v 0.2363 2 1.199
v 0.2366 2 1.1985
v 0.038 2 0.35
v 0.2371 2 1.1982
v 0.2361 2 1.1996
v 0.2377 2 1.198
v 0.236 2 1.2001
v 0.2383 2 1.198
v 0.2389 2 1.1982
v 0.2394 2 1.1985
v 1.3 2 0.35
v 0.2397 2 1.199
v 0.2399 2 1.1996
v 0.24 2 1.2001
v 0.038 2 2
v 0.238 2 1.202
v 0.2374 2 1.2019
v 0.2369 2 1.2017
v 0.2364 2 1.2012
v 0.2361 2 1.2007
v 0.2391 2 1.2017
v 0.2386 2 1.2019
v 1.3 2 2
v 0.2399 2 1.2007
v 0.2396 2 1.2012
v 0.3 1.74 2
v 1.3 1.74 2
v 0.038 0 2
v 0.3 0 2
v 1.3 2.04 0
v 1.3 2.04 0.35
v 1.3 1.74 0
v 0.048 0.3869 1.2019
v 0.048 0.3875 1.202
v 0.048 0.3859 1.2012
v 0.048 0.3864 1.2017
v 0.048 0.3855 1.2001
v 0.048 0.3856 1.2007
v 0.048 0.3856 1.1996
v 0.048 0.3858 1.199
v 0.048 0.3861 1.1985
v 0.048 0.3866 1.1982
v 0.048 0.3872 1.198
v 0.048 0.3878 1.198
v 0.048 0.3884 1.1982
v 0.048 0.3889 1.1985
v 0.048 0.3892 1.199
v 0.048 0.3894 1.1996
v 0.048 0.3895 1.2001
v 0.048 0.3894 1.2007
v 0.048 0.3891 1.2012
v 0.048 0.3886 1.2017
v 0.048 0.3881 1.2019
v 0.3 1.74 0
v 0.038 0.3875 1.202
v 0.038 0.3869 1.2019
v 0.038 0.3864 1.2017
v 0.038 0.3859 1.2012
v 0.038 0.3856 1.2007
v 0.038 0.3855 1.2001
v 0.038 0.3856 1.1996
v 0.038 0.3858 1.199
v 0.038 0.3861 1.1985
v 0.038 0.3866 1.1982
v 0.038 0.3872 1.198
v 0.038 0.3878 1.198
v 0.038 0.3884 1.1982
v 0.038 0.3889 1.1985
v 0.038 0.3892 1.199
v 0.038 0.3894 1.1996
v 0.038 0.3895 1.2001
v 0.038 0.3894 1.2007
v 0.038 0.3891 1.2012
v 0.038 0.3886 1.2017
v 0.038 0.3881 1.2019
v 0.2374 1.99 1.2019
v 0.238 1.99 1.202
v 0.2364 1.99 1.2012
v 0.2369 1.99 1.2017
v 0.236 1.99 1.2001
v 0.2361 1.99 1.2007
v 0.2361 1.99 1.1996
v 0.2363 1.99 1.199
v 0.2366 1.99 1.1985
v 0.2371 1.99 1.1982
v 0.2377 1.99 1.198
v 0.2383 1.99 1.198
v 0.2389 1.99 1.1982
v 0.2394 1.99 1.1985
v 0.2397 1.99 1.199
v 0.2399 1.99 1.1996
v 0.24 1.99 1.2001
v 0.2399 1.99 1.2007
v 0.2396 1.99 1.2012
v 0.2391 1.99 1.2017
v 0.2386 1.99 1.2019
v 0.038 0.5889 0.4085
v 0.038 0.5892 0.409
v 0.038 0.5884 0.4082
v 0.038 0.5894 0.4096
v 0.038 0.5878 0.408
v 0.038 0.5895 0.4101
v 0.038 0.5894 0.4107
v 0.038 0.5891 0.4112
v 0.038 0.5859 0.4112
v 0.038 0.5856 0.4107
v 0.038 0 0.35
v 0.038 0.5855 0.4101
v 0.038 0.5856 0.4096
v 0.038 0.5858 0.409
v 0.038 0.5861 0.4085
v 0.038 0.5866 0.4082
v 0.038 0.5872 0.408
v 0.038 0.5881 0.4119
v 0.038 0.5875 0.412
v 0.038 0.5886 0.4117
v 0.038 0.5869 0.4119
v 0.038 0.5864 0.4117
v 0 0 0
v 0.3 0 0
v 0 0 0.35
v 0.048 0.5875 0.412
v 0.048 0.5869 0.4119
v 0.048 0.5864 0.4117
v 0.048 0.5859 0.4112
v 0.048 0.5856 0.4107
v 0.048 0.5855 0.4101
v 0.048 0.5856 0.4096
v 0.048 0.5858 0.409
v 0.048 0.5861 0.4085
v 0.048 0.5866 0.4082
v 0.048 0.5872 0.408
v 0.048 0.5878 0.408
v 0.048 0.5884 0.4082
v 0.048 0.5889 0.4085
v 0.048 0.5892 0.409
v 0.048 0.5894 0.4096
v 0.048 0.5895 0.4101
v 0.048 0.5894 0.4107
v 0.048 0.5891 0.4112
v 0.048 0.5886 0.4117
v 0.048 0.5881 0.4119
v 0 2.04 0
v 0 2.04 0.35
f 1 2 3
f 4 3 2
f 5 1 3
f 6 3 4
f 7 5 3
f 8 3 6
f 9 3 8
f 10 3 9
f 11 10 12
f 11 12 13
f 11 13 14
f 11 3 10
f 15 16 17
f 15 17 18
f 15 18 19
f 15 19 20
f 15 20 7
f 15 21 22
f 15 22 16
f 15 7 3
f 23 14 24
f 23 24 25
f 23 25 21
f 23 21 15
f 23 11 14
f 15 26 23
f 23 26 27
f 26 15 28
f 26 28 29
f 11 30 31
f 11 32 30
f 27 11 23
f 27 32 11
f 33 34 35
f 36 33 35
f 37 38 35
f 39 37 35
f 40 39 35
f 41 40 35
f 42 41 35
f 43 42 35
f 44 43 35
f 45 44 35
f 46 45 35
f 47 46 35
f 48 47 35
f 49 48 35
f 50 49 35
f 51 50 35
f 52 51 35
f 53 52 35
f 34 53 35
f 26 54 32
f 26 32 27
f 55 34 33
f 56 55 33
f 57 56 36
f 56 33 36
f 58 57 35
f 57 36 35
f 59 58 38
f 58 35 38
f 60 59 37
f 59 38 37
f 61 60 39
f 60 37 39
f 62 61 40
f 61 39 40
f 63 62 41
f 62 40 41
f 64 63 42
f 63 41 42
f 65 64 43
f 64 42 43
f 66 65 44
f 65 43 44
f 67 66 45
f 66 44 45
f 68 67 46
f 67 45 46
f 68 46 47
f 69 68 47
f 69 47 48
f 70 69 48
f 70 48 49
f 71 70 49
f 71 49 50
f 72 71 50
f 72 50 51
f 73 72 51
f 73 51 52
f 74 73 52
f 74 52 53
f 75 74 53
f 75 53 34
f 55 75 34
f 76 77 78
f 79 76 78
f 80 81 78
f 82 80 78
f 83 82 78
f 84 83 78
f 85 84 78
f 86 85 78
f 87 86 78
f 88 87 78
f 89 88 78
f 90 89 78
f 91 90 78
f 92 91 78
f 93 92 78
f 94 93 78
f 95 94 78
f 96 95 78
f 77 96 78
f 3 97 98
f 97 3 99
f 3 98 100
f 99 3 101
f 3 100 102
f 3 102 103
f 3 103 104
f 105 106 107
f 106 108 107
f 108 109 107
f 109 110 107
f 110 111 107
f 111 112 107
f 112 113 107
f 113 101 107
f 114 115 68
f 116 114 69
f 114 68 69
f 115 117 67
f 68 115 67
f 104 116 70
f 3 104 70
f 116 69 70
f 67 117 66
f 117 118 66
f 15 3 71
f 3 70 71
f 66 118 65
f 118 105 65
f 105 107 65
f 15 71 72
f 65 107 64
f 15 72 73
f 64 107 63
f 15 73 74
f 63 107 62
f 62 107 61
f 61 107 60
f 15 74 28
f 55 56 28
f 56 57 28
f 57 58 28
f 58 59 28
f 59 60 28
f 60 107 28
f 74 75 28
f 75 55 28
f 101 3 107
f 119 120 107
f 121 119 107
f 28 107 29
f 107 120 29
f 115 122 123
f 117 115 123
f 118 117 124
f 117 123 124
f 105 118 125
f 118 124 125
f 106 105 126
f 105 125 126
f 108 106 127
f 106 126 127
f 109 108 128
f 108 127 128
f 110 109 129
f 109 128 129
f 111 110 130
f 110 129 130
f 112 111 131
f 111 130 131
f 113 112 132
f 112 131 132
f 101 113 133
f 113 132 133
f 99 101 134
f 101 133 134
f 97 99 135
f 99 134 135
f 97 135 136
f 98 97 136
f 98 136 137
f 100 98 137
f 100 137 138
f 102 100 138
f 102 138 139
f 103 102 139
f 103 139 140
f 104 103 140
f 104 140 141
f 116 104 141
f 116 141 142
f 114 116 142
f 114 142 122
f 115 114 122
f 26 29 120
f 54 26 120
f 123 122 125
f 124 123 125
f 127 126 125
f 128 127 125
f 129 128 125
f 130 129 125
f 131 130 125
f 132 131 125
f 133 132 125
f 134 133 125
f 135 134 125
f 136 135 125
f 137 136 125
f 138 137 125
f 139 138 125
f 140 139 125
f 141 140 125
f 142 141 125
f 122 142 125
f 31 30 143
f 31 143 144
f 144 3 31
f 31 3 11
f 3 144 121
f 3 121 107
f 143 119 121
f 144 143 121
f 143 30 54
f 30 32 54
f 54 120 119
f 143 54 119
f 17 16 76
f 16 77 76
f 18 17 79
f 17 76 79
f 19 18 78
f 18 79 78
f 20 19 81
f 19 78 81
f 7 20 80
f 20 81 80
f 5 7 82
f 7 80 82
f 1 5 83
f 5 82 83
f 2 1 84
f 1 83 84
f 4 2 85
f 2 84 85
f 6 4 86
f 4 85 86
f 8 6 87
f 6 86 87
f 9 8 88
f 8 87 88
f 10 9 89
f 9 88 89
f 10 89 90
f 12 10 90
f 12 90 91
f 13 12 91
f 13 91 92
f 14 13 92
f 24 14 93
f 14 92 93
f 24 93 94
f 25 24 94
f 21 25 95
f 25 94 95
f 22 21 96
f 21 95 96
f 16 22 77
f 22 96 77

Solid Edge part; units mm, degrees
sketch "Sketch1" plane through (0, 0, 0) normal (0, -1, 0) x (1, 0, 0)
  line L0 (0, 0) -> (0, 0.35)
  line L1 (0, 0.35) -> (0.038, 0.35)
  line L2 (0.038, 0.35) -> (0.038, 2)
  line L3 (0.038, 2) -> (0.3, 2)
  line L4 (0.3, 2) -> (0.3, 0)
  line L5 (0.3, 0) -> (0, 0)
  dimension "D1" = 0.35
  dimension "D2" = 0.038
  dimension "D3" = 0.3
  dimension "D4" = 2
extrude "Protrusion1" add sketch "Sketch1" against normal blind 2
hole "Bohrung_1" at (0.038, 0.5875, 0.41) direction (1, 0, 0) diameter 0.004 depth 0.01
hole "Hole1" at (0.038, 0.3875, 1.2) direction (1, 0, 0) diameter 0.004 depth 0.01
hole "Bohrung_3" at (0.238, 2, 1.2) direction (0, -1, 0) diameter 0.004 depth 0.01
sketch "Sketch2" plane through (0.15, 2, 1) normal (0, 1, 0) x (0, 0, 1)
  line L0 (-1, 0.15) -> (-1, -0.15)
  line L1 (-1, -0.15) -> (-0.65, -0.15)
  line L2 (-0.65, -0.15) -> (-0.65, 0.15)
  line L3 (-0.65, 0.15) -> (-1, 0.15)
extrude "Ausprägung_2" add sketch "Sketch2" along normal blind 0.04
sketch "Sketch3" plane through (0.3, 1.02, 1) normal (1, 0, 0) x (0, 1, 0)
  line L0 (1.02, -1) -> (1.02, -0.65)
  line L1 (1.02, -0.65) -> (0.98, -0.65)
  line L2 (0.98, -0.65) -> (0.98, 1)
  line L3 (0.98, 1) -> (0.72, 1)
  line L4 (0.72, -1) -> (0.72, 1)
  line L5 (1.02, -1) -> (0.72, -1)
  dimension "D1" = 0.3
extrude "Ausprägung_3" add sketch "Sketch3" along normal blind 1
